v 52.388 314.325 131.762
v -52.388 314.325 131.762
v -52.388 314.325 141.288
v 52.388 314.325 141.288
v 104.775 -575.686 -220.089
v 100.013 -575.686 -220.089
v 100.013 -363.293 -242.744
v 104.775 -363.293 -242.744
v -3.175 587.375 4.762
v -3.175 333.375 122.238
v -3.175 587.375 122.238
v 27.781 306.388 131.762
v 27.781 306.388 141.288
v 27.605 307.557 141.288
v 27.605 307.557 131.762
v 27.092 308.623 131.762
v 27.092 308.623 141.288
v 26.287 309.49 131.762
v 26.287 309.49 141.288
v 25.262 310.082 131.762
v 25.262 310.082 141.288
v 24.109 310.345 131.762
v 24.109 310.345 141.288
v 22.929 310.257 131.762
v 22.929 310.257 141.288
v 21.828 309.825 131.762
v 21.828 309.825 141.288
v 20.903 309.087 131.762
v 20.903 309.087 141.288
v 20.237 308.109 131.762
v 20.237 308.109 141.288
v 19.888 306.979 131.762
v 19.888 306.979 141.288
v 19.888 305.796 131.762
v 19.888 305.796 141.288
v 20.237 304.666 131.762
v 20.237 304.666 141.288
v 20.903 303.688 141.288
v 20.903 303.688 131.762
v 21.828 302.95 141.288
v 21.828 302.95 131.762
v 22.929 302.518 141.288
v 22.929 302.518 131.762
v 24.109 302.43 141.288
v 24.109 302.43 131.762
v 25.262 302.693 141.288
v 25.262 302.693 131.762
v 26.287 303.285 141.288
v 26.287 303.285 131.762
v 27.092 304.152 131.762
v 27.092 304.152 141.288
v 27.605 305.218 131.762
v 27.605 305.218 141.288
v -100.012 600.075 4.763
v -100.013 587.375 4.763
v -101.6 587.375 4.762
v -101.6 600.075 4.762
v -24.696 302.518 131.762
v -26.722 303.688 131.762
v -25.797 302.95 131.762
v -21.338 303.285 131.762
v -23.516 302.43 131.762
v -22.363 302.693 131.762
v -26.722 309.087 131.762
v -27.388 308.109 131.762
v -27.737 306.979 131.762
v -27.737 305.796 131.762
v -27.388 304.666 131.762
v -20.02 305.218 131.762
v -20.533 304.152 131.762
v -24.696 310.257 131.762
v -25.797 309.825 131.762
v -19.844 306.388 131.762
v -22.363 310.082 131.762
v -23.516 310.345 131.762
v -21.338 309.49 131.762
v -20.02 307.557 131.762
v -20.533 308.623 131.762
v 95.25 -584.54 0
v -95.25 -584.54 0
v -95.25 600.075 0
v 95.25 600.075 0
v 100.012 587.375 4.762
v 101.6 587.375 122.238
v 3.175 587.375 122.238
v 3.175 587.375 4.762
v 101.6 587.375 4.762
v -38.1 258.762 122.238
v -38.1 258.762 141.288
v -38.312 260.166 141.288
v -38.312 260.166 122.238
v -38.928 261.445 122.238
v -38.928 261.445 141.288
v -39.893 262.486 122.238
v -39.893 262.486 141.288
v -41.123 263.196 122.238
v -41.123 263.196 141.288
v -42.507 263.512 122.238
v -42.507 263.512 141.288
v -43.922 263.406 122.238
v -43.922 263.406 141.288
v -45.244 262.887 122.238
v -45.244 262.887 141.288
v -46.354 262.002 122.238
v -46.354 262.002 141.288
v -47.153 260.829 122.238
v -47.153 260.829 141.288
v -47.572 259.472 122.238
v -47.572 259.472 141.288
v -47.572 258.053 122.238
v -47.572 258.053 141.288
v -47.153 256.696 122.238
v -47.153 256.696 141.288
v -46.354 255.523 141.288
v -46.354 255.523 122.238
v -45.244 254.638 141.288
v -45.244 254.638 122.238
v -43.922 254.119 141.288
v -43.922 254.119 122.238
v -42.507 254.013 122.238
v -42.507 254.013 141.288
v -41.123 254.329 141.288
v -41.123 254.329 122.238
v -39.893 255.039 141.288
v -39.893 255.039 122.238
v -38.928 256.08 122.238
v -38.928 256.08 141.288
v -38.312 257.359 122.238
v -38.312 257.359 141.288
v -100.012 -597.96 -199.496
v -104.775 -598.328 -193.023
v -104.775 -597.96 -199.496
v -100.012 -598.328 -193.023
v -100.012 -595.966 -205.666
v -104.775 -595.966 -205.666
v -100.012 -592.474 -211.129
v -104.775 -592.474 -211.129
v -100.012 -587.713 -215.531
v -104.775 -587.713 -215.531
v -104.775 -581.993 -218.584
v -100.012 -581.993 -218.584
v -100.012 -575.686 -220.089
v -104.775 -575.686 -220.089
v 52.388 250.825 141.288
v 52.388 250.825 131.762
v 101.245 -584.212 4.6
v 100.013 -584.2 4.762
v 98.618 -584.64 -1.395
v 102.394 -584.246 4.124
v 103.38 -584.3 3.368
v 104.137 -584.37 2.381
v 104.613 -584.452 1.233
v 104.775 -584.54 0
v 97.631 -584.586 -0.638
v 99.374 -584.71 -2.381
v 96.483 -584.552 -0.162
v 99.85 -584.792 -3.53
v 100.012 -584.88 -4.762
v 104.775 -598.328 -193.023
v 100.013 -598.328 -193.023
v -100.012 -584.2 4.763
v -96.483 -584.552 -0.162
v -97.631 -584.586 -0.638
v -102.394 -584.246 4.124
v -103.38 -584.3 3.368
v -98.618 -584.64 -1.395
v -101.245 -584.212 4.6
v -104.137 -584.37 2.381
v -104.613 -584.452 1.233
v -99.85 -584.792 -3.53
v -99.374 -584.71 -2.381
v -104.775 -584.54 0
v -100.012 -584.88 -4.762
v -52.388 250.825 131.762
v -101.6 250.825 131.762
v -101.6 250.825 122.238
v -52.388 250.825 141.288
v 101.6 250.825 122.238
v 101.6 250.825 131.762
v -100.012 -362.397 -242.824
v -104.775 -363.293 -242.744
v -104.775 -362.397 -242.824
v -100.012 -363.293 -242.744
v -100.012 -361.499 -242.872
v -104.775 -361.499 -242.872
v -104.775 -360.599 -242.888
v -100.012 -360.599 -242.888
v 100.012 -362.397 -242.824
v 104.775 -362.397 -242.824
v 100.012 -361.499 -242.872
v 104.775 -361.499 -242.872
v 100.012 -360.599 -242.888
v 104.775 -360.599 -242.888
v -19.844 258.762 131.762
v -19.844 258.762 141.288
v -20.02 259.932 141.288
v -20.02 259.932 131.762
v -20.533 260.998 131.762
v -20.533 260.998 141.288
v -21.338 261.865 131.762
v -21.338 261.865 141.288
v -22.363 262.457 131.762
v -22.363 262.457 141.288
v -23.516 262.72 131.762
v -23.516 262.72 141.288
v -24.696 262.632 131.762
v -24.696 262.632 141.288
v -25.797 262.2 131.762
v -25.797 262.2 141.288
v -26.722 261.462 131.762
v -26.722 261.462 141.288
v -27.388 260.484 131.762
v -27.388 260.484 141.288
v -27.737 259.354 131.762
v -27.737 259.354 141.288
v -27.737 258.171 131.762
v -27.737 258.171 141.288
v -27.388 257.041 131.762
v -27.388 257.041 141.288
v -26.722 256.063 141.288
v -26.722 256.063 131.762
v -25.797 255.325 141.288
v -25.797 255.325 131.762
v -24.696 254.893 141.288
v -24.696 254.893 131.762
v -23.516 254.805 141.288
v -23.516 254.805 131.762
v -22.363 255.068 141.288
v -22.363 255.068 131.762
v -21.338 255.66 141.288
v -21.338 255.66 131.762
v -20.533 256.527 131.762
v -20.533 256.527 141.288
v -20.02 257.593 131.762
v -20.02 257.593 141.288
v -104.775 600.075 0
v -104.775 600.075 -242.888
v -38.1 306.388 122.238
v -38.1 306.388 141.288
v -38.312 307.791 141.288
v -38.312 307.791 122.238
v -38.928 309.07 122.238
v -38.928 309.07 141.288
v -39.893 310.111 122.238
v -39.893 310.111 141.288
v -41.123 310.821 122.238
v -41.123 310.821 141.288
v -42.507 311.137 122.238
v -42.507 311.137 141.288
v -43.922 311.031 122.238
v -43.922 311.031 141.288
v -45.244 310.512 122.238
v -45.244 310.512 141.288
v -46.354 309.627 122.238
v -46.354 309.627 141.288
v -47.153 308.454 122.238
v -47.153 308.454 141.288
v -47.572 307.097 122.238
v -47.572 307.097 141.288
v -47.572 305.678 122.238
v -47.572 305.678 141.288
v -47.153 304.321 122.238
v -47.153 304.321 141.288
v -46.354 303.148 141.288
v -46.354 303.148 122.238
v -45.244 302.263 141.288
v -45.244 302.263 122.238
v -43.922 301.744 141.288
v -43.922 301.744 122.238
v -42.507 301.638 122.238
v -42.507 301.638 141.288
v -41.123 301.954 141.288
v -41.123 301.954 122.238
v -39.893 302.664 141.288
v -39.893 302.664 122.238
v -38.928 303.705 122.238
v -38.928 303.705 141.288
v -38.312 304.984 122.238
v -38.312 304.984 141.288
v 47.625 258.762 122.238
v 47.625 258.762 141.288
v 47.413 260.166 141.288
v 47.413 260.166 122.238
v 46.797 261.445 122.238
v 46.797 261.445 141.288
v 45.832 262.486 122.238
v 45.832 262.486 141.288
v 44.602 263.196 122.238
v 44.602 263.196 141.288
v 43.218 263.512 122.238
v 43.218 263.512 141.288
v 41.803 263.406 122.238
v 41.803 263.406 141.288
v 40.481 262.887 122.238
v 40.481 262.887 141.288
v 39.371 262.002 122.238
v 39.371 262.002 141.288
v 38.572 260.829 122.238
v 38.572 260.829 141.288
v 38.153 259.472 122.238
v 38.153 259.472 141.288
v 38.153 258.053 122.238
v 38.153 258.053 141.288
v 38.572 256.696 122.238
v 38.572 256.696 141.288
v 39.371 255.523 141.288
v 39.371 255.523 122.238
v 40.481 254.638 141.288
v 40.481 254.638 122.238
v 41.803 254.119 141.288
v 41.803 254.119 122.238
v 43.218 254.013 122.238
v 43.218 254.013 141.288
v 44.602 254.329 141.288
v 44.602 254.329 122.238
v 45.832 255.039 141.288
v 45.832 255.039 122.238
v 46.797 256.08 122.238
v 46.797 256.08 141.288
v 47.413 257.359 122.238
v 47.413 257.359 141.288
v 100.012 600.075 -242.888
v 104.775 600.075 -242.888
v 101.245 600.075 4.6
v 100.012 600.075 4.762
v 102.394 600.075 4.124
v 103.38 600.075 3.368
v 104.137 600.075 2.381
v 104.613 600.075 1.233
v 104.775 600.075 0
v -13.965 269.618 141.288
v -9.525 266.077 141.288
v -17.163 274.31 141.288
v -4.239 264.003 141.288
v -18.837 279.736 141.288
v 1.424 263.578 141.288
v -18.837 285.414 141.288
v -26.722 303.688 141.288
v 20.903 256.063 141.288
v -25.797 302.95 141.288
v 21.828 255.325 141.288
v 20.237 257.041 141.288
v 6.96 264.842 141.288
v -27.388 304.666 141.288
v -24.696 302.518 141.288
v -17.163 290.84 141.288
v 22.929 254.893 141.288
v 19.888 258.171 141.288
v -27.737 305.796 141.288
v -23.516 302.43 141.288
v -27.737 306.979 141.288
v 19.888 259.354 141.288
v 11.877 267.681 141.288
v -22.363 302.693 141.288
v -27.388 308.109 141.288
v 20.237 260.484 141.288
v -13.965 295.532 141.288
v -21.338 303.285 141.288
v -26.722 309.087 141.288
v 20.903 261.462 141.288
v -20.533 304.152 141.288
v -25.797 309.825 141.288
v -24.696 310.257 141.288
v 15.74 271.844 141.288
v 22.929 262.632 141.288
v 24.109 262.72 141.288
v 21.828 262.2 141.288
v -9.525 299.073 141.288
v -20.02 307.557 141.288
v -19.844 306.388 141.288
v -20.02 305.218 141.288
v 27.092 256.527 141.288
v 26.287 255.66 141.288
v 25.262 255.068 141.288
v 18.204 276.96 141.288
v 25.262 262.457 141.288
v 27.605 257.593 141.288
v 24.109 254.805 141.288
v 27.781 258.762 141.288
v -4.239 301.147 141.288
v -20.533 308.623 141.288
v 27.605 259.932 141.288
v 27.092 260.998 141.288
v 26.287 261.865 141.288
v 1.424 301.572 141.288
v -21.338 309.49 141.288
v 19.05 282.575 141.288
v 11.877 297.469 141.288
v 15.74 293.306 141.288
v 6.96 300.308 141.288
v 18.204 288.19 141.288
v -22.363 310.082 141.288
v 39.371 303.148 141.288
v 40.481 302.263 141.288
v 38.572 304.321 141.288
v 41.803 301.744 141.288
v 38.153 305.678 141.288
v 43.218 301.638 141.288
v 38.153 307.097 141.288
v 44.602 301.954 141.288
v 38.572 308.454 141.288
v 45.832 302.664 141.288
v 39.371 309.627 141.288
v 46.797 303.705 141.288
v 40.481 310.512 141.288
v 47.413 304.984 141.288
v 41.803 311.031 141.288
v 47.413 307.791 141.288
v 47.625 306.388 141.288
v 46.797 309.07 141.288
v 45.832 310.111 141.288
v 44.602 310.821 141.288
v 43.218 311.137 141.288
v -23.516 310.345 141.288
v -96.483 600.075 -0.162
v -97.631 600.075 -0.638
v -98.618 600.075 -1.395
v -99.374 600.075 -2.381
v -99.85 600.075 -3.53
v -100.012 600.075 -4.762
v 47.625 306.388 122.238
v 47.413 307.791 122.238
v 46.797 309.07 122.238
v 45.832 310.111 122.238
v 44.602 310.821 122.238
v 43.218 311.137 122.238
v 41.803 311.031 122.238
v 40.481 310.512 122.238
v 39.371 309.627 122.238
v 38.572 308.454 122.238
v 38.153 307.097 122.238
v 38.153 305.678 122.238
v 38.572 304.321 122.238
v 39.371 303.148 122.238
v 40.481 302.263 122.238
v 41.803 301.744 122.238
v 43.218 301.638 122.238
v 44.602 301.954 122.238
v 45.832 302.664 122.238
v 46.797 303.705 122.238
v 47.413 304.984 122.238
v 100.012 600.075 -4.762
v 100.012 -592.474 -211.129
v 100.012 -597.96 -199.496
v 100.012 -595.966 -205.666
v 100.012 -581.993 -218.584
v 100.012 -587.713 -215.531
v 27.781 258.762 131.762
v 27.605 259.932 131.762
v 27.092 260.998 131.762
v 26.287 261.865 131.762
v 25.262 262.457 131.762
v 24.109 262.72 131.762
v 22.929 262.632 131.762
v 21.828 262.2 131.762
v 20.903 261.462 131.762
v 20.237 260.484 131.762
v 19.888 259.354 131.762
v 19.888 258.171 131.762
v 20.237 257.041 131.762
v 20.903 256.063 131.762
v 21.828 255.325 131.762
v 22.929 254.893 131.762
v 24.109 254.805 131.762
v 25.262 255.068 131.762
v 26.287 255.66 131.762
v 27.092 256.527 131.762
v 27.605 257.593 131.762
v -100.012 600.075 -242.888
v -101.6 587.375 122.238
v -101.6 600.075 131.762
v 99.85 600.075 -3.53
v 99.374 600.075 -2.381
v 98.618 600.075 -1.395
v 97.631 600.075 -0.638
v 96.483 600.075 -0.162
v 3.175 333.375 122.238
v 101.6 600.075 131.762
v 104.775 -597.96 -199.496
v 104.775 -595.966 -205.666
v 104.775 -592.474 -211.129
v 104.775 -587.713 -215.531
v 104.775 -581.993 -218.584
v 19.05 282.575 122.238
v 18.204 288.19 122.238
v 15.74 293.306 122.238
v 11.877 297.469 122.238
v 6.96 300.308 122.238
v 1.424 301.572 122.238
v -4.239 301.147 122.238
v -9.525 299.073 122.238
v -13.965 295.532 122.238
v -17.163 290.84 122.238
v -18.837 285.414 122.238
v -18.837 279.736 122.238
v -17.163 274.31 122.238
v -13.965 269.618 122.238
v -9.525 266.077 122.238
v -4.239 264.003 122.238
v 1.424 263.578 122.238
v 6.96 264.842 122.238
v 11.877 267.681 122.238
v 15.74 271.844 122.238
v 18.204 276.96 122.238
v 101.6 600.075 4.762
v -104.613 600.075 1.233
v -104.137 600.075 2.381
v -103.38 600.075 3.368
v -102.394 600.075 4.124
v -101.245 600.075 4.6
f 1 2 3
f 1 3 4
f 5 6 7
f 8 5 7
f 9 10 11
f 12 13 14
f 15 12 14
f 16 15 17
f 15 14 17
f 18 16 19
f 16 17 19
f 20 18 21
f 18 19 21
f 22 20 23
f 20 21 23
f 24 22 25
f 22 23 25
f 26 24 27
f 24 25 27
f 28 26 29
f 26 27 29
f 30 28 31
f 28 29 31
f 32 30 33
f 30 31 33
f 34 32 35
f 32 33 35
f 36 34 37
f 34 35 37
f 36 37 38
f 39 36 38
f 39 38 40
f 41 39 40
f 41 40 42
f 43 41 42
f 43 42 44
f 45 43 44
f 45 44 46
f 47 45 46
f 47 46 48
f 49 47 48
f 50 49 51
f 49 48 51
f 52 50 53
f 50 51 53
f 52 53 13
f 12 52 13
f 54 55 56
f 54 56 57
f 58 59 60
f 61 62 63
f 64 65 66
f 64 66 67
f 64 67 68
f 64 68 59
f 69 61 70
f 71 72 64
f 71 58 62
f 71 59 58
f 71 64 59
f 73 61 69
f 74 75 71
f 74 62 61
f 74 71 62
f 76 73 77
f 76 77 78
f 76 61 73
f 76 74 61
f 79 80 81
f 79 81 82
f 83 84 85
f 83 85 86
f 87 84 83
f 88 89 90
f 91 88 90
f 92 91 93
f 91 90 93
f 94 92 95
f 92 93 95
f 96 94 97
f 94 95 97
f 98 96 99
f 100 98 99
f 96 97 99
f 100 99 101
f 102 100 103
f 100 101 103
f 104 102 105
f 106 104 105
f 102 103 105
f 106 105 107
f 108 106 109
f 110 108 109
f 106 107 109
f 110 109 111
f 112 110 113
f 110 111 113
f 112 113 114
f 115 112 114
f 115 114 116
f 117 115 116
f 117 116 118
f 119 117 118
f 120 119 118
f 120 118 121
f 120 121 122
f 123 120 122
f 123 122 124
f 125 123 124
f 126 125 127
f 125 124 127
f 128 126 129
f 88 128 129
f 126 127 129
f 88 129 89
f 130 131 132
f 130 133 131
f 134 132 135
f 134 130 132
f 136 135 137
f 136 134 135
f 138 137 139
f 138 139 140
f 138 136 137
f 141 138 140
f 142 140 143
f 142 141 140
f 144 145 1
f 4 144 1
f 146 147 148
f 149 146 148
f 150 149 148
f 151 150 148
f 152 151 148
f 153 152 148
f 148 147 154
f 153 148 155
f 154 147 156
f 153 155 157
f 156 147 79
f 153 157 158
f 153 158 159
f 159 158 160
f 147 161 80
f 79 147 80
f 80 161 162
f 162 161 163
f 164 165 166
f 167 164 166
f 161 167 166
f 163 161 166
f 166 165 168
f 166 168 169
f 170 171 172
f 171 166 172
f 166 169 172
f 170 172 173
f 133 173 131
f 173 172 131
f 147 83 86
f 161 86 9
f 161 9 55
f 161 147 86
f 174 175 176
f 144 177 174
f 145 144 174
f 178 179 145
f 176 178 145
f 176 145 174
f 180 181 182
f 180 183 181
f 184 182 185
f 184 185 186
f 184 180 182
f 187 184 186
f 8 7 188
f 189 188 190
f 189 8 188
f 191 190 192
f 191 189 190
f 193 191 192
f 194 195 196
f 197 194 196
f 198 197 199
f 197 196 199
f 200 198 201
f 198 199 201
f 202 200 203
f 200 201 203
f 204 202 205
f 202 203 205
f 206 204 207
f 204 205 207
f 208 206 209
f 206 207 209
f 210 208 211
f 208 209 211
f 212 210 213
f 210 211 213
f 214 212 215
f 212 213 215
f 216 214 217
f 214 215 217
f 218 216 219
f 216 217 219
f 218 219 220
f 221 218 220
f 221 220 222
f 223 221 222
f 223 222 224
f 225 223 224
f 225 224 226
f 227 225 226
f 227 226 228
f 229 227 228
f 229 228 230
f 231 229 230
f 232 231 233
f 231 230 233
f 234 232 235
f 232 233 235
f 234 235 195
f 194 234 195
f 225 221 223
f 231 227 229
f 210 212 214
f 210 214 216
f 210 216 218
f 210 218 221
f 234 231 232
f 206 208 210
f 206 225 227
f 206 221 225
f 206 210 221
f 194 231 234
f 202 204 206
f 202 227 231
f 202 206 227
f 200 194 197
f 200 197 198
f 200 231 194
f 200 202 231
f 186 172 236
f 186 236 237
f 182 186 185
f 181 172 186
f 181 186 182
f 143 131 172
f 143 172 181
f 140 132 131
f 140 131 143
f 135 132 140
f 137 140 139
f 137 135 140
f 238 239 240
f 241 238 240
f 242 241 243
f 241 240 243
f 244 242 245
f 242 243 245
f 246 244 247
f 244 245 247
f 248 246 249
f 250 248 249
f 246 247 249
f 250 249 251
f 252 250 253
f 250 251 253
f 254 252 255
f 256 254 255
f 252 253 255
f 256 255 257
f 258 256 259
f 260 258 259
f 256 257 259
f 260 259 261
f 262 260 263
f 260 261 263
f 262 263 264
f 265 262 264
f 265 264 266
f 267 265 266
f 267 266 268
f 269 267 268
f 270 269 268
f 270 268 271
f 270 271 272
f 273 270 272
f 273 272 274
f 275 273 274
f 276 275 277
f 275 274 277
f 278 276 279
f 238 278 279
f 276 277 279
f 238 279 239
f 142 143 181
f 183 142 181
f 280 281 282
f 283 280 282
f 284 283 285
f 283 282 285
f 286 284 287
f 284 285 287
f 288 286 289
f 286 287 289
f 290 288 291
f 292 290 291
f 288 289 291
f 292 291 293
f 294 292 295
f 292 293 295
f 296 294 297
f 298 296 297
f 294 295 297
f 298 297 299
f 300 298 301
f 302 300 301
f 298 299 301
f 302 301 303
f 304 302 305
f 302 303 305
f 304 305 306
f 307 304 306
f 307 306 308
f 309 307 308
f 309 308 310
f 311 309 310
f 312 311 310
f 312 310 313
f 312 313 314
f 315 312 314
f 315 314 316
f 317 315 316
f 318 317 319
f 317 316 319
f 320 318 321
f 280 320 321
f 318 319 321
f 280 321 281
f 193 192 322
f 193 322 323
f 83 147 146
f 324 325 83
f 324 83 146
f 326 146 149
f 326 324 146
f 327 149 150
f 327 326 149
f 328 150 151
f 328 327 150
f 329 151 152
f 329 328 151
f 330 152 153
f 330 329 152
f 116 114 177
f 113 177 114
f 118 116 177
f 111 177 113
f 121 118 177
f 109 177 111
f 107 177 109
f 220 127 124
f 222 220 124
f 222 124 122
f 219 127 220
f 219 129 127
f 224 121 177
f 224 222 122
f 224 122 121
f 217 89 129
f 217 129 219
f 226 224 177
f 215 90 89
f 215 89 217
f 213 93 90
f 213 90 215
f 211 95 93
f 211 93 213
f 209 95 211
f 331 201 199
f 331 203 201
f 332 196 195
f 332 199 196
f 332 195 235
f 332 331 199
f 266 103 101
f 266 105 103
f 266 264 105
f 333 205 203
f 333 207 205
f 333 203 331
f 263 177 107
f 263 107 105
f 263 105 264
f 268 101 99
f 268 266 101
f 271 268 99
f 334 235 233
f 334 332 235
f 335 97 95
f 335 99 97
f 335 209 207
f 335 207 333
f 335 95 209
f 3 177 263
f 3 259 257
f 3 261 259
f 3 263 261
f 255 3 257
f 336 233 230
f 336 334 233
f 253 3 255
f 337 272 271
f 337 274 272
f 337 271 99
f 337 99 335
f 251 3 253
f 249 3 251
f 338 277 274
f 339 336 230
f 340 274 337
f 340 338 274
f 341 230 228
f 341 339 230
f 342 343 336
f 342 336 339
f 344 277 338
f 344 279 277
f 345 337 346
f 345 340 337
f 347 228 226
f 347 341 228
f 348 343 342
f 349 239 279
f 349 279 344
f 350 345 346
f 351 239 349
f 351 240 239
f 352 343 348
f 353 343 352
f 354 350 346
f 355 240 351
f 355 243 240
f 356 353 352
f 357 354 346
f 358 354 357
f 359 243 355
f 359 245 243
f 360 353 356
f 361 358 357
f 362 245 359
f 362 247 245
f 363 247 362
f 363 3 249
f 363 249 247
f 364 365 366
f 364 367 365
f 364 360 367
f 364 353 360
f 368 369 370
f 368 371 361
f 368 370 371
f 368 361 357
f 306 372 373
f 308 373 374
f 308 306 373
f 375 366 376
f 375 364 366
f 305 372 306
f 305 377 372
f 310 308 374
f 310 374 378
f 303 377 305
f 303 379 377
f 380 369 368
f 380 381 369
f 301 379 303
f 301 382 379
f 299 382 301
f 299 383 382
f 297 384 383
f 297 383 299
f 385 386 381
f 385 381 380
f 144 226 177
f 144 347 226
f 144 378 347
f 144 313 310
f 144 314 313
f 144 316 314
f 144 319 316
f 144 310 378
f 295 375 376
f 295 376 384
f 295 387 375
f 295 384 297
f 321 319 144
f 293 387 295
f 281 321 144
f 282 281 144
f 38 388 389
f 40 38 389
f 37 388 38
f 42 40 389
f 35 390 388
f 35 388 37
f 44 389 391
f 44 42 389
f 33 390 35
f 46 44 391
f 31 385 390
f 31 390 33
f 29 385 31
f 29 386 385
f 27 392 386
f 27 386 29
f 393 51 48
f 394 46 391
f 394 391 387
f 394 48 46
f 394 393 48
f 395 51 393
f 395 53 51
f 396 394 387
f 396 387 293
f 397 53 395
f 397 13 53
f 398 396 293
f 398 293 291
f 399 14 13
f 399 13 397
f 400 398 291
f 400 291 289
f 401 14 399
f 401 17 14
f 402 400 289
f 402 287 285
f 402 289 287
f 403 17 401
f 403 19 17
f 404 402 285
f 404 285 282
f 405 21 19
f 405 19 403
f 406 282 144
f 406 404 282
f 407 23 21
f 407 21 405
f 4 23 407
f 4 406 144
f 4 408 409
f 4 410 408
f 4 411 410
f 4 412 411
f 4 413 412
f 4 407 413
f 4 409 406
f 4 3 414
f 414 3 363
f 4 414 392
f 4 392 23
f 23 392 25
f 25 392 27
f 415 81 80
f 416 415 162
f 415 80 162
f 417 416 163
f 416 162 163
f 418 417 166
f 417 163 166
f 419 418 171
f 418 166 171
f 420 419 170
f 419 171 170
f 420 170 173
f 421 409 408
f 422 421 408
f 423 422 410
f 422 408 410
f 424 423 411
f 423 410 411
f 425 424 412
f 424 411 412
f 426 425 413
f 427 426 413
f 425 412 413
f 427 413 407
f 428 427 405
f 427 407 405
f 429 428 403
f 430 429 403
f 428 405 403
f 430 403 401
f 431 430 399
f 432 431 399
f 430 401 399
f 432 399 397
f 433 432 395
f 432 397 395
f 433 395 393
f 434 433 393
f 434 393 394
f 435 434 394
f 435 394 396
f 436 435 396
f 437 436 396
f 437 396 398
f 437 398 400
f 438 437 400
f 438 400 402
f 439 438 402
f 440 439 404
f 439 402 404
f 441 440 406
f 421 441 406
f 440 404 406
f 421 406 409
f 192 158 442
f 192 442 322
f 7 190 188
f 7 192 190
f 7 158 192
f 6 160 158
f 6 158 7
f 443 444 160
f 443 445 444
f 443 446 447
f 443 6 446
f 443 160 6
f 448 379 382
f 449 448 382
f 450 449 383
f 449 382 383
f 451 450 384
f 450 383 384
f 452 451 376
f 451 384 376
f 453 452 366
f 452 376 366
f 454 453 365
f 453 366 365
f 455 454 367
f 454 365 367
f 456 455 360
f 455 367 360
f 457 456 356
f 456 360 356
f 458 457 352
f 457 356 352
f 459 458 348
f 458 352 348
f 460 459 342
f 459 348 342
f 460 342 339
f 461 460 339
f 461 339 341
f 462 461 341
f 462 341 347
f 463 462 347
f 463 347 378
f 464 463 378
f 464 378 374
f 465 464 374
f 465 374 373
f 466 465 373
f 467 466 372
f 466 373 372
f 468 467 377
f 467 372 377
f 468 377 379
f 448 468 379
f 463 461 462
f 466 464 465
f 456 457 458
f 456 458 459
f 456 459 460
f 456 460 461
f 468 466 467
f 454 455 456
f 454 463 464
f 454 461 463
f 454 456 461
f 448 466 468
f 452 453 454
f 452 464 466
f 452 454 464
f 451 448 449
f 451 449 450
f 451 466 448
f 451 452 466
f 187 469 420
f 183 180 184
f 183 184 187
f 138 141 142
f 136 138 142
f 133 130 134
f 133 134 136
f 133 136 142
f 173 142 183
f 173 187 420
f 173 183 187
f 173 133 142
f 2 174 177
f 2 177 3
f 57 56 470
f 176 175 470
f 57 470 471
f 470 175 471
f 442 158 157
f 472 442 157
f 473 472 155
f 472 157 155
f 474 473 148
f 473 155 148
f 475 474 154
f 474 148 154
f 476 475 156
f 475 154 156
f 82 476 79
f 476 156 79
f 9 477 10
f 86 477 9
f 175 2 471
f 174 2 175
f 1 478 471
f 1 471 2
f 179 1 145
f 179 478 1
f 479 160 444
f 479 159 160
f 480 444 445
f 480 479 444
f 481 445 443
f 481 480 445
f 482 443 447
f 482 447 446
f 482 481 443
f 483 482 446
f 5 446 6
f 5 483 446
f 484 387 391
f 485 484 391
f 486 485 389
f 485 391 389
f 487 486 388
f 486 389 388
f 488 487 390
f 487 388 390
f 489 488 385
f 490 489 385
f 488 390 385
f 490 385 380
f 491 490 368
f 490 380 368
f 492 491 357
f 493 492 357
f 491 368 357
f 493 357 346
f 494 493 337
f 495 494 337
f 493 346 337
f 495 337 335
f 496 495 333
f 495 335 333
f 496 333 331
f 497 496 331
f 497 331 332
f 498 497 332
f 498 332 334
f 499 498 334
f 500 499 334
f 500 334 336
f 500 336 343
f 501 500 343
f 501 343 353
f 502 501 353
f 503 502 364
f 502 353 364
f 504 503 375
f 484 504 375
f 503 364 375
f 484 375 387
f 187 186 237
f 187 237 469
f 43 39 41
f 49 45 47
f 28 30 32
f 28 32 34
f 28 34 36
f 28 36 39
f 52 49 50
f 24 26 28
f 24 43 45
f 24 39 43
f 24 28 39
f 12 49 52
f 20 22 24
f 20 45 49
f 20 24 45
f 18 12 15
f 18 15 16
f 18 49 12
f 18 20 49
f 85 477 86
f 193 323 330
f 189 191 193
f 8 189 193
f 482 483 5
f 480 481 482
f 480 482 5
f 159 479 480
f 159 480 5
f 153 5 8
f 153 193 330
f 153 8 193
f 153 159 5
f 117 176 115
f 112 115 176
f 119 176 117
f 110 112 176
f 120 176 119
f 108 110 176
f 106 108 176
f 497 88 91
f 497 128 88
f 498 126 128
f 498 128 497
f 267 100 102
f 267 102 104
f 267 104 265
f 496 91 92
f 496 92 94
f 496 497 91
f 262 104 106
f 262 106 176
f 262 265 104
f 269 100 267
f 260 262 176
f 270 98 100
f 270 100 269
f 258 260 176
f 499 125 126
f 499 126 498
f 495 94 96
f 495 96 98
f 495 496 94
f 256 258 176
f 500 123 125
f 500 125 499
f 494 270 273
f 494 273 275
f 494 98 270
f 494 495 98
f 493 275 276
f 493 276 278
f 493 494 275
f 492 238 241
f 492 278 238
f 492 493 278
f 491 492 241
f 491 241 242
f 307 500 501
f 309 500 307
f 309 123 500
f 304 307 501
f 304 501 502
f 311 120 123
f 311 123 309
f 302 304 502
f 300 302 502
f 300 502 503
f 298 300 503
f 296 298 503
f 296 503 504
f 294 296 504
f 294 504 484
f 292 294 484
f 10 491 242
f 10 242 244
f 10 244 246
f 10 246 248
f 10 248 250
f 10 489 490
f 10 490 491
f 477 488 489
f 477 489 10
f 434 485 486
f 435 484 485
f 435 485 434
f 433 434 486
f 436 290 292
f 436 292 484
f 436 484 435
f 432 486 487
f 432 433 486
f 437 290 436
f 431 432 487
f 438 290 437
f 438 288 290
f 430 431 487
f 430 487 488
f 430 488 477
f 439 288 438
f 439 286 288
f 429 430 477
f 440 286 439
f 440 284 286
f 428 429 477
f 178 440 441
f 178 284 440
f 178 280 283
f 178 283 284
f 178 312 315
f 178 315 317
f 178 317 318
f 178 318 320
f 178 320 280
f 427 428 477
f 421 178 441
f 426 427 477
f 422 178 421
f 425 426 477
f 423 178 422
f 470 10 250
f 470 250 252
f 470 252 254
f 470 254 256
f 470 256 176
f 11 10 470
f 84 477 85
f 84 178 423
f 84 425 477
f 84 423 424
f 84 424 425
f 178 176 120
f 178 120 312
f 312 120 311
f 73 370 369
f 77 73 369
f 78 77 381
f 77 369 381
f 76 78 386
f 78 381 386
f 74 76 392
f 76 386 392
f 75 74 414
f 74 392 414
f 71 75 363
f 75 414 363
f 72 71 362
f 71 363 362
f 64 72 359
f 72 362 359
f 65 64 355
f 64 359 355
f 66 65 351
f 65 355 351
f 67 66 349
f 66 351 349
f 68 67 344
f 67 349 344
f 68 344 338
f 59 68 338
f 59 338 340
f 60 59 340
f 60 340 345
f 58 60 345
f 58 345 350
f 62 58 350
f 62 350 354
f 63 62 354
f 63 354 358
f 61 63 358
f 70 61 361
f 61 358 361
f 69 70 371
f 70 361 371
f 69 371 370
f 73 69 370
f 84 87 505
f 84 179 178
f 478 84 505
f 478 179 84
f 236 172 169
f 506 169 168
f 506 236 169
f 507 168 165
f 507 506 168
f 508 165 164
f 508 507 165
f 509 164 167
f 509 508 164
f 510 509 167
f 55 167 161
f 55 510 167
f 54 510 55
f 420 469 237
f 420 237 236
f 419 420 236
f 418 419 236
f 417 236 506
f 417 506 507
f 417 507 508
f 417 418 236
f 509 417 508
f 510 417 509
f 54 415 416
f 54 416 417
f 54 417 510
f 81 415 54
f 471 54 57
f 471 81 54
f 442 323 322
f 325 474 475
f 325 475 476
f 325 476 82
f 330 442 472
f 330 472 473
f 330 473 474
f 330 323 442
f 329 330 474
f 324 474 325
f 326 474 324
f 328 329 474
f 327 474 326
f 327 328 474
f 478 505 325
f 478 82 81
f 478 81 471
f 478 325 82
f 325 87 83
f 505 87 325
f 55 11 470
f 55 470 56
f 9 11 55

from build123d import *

# Parameters (mm, degrees)
F1_DEPTH  = 600.075
F2_R      = 4.7625
F4_DEPTH  = 209.55
F6_DEPTH  = 209.55
F7_R      = 25.4
F9_DEPTH  = 101.6
F11_DEPTH = 3.175
F12_W     = 104.775
F12_H     = 63.5
F13_DEPTH = 9.525
F14_R     = 19.05
F14_R_2   = 4.7625
F15_DEPTH = 19.05
F16_R     = 3.96875
F17_DEPTH = 9.525


with BuildPart() as f1:
    # F0 (on Front) → F1 (new body, symmetric)
    with BuildSketch(Plane.XZ):
        Polygon((-104.775, -242.8875), (-100.0125, -242.8875), (-100.0125, 0), (100.0125, 0), (100.0125, -242.8875), (104.775, -242.8875), (104.775, 4.7625), (-104.775, 4.7625), align=None)
    extrude(amount=F1_DEPTH, both=True)

    # F2
    f2_edges = [f1.edges().sort_by_distance(p)[0] for p in [
        (-104.775, 0, 4.7625),
        (-100.0125, 0, 0),
        (104.775, 0, 4.7625),
        (100.0125, 0, 0),
    ]]
    fillet(f2_edges, radius=F2_R)

    # F3 (on face) → F4 (cut, through all)
    with BuildSketch(Plane(origin=(-104.775, 0, 0), x_dir=(0, -1, 0), z_dir=(-1, 0, 0))):
        Polygon((600.075, -242.8875), (600.075, -217.4875), (361.95, -242.8875), align=None)
    extrude(amount=-F4_DEPTH, mode=Mode.SUBTRACT)

    # F5 (on face) → F6 (cut, through all)
    with BuildSketch(Plane(origin=(-104.775, 0, 0), x_dir=(0, -1, 0), z_dir=(-1, 0, 0))):
        Polygon((584.2, 4.7625), (600.075, -217.4875), (600.075, 4.7625), align=None)
    extrude(amount=-F6_DEPTH, mode=Mode.SUBTRACT)

    # F7
    f7_edges = [f1.edges().sort_by_distance(p)[0] for p in [
        (-102.39375, -600.075, -217.4875),
        (102.39375, -600.075, -217.4875),
        (-102.39375, -361.95, -242.8875),
        (102.39375, -361.95, -242.8875),
    ]]
    fillet(f7_edges, radius=F7_R)

    # F8 (on Right) → F9 (join, symmetric)
    with BuildSketch(Plane.YZ):
        Polygon((587.375, 4.7625), (600.075, 4.7625), (600.075, 131.7625), (250.825, 131.7625), (250.825, 122.2375), (587.375, 122.2375), align=None)
    extrude(amount=F9_DEPTH, both=True)

    # F10 (on Right) → F11 (join, symmetric)
    with BuildSketch(Plane.YZ):
        Polygon((587.375, 4.7625), (587.375, 122.2375), (333.375, 122.2375), align=None)
    extrude(amount=F11_DEPTH, both=True)

    # F12 (on face) → F13 (join)
    with BuildSketch(Plane.XY.offset(131.7625)):
        with Locations((0, 282.575)):
            Rectangle(F12_W, F12_H)
    extrude(amount=F13_DEPTH)

    # F14 (on face) → F15 (cut, through all)
    with BuildSketch(Plane.XY.offset(141.2875)):
        with Locations((0, 282.575)):
            Circle(F14_R)
        with Locations((-42.8625, 306.3875)):
            Circle(F14_R_2)
        with Locations((-42.8625, 258.7625)):
            Circle(F14_R_2)
        with Locations((42.8625, 258.7625)):
            Circle(F14_R_2)
        with Locations((42.8625, 306.3875)):
            Circle(F14_R_2)
    extrude(amount=-F15_DEPTH, mode=Mode.SUBTRACT)

    # F16 (on face) → F17 (cut, through all)
    with BuildSketch(Plane.XY.offset(141.2875)):
        with Locations((-23.8125, 306.3875)):
            Circle(F16_R)
        with Locations((23.8125, 306.3875)):
            Circle(F16_R)
        with Locations((23.8125, 258.7625)):
            Circle(F16_R)
        with Locations((-23.8125, 258.7625)):
            Circle(F16_R)
    extrude(amount=-F17_DEPTH, mode=Mode.SUBTRACT)


solid = f1.part
